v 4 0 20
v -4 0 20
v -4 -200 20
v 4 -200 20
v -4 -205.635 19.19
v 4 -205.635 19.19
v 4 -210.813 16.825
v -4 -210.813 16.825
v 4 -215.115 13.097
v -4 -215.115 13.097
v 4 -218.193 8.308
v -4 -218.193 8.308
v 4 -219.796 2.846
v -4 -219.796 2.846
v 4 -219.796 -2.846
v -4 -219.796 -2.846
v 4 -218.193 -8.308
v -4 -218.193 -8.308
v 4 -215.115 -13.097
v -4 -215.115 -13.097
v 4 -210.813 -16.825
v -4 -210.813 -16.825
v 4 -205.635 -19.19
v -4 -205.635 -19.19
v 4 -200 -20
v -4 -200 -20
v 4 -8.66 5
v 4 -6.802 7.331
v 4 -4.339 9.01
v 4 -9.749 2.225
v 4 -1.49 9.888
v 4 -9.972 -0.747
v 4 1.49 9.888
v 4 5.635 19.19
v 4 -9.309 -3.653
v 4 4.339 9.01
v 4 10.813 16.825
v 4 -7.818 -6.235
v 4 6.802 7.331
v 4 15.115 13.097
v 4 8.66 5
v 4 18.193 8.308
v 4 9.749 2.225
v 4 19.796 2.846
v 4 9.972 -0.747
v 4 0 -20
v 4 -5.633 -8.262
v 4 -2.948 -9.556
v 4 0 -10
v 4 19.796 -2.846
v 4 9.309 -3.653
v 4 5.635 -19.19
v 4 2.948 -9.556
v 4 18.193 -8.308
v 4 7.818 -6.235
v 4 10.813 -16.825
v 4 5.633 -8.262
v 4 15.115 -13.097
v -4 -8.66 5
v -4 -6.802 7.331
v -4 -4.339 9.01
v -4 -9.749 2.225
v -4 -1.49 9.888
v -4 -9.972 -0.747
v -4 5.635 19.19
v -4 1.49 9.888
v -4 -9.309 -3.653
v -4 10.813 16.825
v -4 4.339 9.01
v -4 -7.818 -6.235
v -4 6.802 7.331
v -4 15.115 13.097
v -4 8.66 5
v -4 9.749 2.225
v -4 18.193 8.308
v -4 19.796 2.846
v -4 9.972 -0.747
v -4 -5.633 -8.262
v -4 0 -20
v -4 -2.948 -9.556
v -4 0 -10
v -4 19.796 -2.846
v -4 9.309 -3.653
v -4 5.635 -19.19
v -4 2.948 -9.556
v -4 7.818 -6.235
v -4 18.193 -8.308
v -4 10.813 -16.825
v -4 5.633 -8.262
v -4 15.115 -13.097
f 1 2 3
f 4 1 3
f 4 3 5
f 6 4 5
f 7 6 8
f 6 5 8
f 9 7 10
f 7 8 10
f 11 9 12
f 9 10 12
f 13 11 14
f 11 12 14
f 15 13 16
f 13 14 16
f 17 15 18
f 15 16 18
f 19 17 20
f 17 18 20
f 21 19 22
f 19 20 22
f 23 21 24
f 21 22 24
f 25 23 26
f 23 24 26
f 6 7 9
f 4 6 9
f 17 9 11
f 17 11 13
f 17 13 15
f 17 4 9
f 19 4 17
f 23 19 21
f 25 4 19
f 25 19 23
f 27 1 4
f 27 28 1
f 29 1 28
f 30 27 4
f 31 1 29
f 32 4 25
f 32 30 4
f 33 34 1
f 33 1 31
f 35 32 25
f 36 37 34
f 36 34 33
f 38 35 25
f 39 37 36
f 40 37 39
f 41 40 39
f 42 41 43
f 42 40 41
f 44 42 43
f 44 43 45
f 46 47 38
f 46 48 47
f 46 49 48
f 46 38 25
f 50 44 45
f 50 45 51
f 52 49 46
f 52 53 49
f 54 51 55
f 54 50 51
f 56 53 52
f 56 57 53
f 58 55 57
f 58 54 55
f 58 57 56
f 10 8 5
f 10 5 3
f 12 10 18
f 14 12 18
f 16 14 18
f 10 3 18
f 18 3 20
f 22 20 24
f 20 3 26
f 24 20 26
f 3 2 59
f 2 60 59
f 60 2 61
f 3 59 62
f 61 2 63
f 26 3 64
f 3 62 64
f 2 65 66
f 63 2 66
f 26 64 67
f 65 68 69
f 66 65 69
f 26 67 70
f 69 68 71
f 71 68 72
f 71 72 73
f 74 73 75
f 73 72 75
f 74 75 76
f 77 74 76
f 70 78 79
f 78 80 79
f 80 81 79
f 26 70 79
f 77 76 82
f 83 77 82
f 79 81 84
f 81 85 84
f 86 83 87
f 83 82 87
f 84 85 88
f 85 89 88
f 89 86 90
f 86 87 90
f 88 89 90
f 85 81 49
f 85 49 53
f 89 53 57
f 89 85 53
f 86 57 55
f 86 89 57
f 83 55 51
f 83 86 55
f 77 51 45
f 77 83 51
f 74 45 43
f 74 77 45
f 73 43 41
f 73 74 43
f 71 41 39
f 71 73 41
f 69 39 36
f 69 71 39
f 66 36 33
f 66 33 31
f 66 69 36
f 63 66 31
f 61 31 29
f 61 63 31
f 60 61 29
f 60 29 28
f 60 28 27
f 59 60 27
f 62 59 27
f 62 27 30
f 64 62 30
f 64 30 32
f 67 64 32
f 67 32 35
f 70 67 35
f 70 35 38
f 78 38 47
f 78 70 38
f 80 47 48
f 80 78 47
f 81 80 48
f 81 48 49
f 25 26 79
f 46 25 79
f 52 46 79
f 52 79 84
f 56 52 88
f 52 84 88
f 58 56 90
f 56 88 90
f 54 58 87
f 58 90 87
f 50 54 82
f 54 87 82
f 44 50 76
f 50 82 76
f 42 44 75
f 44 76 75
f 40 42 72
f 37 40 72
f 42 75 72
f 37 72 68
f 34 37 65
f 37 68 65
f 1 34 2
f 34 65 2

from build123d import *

# Parameters (mm, degrees)
BOSS_EXTRUDE1_DEPTH      = 4
BOSS_EXTRUDE1_DEPTH_BACK = 4
SKETCH2_R                = 20
SKETCH2_R_2              = 10


with BuildPart() as part:
    # Sketch2 → Boss-Extrude1 (new, two sides: drawn at the far end of the back side and taken through both)
    # profile 1 of 3: a face of its own
    with BuildSketch(Plane(origin=(0, 0, 0), x_dir=(0, 0, -1), z_dir=(1, 0, 0)).offset(-BOSS_EXTRUDE1_DEPTH_BACK)):
        with BuildLine():
            ThreePointArc((20, 0), (0, -20), (-20, 0))
            Line((-20, 0), (-20, -200))
            ThreePointArc((-20, -200), (0, -180), (20, -200))
            Line((20, -200), (20, 0))
        make_face()
    # profile 2 of 3: a face of its own
    with BuildSketch(Plane(origin=(0, 0, 0), x_dir=(0, 0, -1), z_dir=(1, 0, 0)).offset(-BOSS_EXTRUDE1_DEPTH_BACK)):
        Circle(SKETCH2_R)
        Circle(SKETCH2_R_2, mode=Mode.SUBTRACT)
    # profile 3 of 3: a face of its own
    with BuildSketch(Plane(origin=(0, 0, 0), x_dir=(0, 0, -1), z_dir=(1, 0, 0)).offset(-BOSS_EXTRUDE1_DEPTH_BACK)):
        with Locations((0, -200)):
            Circle(SKETCH2_R)
    extrude(amount=BOSS_EXTRUDE1_DEPTH + BOSS_EXTRUDE1_DEPTH_BACK)


solid = part.part
